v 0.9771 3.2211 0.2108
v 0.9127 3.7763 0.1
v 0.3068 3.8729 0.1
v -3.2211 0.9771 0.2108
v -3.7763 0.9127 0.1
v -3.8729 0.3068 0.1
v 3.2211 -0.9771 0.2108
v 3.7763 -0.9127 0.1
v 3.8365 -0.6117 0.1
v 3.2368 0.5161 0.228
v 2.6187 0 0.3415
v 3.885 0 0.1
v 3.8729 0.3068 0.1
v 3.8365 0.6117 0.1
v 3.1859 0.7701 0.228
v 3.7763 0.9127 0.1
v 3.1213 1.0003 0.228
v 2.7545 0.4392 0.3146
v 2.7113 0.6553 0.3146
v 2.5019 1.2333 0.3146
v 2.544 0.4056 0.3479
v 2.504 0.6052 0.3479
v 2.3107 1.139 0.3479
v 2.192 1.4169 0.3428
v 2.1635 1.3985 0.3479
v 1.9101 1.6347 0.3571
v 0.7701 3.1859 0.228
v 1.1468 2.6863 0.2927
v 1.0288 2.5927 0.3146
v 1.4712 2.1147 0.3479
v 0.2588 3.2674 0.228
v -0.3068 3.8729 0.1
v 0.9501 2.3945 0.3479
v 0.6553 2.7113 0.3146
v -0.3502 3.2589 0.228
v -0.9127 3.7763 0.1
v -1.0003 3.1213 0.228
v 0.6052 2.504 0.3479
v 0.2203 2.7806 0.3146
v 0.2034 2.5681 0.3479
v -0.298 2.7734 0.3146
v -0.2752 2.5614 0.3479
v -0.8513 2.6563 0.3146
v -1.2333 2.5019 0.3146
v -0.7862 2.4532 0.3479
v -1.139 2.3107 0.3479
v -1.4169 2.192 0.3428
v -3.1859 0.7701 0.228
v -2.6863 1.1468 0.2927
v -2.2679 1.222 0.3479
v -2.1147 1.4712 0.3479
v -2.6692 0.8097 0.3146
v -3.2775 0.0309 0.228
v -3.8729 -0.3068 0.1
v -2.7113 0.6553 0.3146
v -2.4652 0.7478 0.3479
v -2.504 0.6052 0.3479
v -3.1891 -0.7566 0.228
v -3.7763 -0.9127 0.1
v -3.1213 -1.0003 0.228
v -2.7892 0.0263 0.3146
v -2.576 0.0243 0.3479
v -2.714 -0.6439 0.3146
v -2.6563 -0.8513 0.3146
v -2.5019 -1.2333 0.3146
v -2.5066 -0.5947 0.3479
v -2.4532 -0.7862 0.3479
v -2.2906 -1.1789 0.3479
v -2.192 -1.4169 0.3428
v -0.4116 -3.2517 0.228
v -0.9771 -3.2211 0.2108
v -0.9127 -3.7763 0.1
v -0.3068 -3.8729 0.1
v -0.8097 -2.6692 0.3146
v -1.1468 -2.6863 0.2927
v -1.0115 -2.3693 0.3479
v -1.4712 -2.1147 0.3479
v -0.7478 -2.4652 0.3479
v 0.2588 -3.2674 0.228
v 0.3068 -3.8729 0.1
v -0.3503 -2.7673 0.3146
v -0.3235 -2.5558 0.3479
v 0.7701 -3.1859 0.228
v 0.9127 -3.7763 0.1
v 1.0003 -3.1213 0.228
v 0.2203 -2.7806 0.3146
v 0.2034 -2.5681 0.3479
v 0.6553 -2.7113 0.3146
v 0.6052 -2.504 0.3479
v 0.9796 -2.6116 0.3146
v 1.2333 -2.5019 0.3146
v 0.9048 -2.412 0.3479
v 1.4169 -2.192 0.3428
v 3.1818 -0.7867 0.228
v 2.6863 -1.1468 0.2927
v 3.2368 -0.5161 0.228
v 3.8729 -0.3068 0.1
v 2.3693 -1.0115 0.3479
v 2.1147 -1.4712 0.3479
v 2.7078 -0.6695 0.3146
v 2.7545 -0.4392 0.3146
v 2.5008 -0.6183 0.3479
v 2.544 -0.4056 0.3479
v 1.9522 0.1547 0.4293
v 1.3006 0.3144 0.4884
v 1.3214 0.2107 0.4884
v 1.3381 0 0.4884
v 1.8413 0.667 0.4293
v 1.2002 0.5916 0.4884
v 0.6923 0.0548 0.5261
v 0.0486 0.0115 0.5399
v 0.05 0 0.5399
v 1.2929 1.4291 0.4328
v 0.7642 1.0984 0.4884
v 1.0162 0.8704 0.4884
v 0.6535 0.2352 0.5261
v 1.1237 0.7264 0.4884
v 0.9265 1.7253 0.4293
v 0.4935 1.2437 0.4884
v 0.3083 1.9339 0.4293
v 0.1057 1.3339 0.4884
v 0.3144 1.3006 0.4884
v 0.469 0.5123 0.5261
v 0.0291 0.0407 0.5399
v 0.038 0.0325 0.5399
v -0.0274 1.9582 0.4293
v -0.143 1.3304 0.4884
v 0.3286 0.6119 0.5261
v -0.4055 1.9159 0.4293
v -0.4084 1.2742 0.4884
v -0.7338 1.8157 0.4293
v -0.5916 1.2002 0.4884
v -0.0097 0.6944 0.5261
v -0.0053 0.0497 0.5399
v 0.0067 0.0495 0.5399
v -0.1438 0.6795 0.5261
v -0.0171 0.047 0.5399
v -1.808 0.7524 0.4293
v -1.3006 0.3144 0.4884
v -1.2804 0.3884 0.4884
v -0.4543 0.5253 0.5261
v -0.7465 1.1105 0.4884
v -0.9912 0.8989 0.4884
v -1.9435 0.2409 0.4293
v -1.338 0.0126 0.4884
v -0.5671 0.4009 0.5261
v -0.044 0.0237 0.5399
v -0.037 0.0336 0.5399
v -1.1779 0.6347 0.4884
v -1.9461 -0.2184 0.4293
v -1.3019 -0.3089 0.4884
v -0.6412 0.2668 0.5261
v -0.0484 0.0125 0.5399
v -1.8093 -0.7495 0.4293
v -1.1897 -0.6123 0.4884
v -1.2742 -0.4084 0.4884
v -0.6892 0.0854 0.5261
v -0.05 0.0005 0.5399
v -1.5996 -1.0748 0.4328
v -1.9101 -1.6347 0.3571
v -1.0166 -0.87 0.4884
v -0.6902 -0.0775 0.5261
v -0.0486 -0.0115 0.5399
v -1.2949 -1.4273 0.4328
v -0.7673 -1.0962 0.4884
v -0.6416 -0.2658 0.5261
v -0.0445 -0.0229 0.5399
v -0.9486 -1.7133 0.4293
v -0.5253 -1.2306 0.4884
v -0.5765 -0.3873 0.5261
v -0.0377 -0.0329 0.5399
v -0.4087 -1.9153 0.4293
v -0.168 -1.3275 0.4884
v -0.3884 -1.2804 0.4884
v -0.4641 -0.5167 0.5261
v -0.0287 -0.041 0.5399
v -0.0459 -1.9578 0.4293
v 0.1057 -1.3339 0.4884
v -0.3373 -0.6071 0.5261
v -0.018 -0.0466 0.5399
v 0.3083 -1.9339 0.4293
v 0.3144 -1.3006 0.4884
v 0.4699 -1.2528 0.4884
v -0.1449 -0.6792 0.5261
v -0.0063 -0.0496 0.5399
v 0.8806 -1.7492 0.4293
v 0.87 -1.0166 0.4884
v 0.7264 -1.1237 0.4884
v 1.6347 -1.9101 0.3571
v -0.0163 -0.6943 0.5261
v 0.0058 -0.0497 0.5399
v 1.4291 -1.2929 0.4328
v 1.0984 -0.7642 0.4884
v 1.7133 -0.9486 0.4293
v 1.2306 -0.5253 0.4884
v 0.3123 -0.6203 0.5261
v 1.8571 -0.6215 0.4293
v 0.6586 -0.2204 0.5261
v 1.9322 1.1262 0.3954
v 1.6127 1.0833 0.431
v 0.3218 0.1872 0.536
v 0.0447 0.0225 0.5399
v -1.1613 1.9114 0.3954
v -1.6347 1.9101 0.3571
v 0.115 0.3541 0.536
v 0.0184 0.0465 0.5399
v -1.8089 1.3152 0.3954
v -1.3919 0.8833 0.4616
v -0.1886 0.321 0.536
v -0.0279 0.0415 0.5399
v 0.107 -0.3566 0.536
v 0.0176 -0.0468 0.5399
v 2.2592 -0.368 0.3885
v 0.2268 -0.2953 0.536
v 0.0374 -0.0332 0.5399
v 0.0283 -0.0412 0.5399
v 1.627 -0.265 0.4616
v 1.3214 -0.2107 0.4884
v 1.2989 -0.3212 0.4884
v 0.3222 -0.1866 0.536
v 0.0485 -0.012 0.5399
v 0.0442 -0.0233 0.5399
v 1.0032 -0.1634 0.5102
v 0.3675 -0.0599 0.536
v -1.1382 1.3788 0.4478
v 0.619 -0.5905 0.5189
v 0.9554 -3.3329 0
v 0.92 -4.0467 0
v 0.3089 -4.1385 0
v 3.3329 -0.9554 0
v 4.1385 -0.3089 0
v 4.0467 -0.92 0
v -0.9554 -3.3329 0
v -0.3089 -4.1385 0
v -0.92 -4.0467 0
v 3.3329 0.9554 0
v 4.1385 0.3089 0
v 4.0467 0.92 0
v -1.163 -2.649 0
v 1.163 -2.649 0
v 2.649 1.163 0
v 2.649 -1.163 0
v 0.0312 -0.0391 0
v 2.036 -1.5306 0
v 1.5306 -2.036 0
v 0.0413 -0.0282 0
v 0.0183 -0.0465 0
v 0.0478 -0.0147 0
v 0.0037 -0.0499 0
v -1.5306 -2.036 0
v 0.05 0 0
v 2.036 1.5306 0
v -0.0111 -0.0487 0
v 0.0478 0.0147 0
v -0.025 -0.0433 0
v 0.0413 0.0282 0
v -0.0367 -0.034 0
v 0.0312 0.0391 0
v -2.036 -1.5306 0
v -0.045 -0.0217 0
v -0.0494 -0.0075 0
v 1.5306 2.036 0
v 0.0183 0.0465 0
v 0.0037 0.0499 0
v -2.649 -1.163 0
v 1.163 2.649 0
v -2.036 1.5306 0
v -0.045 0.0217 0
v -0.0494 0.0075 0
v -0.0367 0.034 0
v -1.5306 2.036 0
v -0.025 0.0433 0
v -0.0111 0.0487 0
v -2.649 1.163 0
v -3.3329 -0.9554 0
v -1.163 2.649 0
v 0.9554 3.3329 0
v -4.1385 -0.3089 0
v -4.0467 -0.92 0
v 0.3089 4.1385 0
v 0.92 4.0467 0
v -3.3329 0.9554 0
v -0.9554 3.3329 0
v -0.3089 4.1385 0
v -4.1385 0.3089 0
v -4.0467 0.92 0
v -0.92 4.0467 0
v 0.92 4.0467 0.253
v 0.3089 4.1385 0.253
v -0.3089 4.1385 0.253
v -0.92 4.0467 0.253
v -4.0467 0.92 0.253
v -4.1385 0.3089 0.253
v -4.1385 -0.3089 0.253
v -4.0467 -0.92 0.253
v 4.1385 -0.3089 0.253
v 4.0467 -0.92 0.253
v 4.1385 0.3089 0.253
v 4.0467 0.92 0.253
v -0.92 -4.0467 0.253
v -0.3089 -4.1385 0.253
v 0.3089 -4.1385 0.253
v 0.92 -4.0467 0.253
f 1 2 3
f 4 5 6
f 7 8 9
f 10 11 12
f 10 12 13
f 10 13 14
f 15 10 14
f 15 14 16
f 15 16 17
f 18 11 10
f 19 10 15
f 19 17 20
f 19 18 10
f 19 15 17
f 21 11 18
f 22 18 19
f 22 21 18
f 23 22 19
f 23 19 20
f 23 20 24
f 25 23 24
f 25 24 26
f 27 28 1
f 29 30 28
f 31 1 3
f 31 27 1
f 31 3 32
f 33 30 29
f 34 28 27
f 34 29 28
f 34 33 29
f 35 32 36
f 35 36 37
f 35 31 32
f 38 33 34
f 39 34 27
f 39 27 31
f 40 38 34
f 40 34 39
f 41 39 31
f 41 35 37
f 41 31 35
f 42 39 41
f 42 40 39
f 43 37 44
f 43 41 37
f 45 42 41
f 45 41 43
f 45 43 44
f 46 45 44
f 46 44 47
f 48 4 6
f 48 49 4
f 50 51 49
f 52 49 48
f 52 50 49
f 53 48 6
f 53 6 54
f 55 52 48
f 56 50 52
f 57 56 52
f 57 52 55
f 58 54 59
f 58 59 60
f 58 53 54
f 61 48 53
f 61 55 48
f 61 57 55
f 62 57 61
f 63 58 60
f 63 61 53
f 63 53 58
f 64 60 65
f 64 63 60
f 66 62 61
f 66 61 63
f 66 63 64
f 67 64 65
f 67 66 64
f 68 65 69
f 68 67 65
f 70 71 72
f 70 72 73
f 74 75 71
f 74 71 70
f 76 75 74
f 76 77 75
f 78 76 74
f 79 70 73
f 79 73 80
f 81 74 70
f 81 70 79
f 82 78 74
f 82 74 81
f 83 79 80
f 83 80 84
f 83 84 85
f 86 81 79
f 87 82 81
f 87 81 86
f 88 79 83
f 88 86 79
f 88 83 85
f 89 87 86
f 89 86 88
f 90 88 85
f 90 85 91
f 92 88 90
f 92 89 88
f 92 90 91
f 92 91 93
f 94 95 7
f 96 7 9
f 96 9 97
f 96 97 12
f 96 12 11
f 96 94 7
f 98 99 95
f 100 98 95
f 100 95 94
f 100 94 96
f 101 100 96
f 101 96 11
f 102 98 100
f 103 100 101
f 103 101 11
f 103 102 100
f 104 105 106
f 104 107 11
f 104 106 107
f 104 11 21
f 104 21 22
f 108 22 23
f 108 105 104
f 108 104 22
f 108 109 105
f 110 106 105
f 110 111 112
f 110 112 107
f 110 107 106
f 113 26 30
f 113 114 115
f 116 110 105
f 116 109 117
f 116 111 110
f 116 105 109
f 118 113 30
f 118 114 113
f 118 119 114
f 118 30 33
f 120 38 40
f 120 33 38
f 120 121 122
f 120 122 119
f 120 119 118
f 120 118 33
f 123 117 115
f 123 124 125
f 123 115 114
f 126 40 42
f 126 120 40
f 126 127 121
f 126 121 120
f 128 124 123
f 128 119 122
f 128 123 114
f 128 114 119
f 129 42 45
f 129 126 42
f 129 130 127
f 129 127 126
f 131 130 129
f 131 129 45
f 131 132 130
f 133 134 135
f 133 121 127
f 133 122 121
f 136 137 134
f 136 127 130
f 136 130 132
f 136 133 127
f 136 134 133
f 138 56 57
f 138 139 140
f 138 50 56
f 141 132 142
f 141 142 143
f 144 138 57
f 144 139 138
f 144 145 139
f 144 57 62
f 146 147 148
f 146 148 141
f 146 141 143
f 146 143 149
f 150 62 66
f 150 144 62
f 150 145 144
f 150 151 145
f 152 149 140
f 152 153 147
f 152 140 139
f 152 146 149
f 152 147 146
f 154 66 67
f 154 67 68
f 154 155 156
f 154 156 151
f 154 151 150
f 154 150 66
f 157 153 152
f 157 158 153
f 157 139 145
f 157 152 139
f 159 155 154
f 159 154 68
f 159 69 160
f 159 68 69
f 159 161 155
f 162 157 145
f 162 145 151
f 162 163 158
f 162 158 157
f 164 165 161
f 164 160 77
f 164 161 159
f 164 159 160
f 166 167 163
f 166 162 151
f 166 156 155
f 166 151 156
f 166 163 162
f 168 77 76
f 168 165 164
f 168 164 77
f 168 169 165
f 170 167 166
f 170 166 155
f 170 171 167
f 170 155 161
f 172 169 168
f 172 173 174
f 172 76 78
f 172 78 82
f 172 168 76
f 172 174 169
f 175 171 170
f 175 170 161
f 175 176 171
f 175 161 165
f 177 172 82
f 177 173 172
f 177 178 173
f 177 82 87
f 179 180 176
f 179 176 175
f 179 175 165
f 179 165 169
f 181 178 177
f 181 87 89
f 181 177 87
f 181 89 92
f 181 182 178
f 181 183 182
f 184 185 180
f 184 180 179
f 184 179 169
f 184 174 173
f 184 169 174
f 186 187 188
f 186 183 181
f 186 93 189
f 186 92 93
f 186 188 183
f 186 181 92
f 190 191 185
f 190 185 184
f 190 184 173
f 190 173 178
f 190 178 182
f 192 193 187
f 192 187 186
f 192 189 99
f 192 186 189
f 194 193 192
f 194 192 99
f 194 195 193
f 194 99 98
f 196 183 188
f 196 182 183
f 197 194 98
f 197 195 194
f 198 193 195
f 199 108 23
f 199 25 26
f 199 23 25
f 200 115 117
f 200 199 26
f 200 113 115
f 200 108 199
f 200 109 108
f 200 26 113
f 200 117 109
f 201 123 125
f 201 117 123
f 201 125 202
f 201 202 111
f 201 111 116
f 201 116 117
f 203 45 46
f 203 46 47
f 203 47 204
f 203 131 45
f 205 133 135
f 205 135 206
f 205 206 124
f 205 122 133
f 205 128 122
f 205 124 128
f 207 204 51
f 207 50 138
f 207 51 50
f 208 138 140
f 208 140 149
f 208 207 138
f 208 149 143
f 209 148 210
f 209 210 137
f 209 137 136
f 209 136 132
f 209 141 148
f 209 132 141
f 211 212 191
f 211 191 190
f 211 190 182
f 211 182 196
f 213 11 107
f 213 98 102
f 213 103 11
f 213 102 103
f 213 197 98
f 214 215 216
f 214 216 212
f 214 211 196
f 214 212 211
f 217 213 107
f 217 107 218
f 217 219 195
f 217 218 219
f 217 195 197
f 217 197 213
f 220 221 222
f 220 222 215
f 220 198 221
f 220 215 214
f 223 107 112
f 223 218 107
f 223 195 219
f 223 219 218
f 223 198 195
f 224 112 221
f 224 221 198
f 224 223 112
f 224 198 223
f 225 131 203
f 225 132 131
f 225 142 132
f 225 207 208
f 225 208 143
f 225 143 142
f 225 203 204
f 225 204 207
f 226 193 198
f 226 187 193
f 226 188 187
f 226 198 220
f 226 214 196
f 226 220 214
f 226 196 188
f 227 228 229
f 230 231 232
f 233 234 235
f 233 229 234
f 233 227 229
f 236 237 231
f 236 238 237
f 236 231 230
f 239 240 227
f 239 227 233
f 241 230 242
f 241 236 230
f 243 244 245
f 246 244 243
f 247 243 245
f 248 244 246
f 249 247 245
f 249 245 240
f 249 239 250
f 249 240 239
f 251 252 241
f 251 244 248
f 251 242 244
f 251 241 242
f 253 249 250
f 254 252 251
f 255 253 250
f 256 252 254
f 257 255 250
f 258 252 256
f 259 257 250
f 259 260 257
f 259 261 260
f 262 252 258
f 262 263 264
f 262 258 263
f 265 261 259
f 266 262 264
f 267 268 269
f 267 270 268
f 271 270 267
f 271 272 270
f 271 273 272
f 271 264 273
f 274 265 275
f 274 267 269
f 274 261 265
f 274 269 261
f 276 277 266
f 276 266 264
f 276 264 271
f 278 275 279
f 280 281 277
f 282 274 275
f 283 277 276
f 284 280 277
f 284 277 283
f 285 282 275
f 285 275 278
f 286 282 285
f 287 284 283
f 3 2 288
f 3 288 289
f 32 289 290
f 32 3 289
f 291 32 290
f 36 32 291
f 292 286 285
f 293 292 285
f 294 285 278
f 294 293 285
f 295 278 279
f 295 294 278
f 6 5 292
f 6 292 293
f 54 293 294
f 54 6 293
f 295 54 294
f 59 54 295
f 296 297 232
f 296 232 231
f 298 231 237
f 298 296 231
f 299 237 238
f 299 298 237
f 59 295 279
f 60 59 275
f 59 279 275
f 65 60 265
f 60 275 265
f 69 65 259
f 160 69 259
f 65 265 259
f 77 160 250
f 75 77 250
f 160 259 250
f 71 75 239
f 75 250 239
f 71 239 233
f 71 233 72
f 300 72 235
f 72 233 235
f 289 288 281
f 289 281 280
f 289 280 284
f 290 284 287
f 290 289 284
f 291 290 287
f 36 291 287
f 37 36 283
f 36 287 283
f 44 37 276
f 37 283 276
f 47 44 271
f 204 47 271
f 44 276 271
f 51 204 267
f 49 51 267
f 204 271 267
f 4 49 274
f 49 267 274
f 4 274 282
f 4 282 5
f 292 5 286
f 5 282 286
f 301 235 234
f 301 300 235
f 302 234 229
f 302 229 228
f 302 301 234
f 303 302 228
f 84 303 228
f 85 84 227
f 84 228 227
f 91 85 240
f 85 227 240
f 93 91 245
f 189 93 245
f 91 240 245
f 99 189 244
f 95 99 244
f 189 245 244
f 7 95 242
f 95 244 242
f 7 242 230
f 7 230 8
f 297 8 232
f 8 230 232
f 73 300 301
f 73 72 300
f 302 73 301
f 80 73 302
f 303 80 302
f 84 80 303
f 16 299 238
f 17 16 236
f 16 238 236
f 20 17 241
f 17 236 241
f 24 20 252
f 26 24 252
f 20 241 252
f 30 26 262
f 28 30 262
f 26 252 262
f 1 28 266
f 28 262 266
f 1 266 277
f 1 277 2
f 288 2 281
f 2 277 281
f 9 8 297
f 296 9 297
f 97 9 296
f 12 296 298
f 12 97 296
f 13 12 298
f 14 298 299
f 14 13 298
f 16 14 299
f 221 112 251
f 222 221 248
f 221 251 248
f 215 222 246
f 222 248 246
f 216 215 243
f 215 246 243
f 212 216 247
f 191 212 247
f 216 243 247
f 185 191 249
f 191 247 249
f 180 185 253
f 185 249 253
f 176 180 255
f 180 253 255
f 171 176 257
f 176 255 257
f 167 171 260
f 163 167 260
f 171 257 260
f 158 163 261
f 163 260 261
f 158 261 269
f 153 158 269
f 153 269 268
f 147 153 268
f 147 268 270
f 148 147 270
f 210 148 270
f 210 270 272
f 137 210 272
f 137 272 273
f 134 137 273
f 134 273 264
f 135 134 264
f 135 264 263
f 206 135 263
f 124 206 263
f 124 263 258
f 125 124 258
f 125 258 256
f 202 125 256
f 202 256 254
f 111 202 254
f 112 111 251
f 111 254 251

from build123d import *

# Parameters (mm, degrees)
F2_R     = 2.921115
F3_DEPTH = 0.541
F4_R     = 0.05
F5_DEPTH = 25


with BuildPart() as f1:
    # F0 (on Front) → F1 (revolve)
    with BuildSketch(Plane.XZ):
        with BuildLine():
            Line((4.15, 0.252998), (3.885, 0.1))
            ThreePointArc((3.885, 0.1), (1.954918, 0.42965), (0, 0.54))
            Line((0, 0.54), (0, 0))
            Line((0, 0), (4.15, 0))
            Line((4.15, 0), (4.15, 0.252998))
        make_face()
    revolve(axis=Axis((0, 0, 0.27), (0, 0, 1)))

    # F2 (on face) → F3 (cut, through all)
    with BuildSketch(Plane(origin=(0, 0, 0), x_dir=(1, 0, 0), z_dir=(0, 0, -1))):
        with Locations((-3.833307, 3.833307)):
            Circle(F2_R)
        with Locations((3.833307, 3.833307)):
            Circle(F2_R)
        with Locations((-3.833307, -3.833307)):
            Circle(F2_R)
        with Locations((3.833307, -3.833307)):
            Circle(F2_R)
    extrude(amount=-F3_DEPTH, mode=Mode.SUBTRACT)

    # F4 (on face) → F5 (cut)
    with BuildSketch(Plane(origin=(0, 0, 0), x_dir=(1, 0, 0), z_dir=(0, 0, -1))):
        Circle(F4_R)
    extrude(amount=-F5_DEPTH, mode=Mode.SUBTRACT)


solid = f1.part
